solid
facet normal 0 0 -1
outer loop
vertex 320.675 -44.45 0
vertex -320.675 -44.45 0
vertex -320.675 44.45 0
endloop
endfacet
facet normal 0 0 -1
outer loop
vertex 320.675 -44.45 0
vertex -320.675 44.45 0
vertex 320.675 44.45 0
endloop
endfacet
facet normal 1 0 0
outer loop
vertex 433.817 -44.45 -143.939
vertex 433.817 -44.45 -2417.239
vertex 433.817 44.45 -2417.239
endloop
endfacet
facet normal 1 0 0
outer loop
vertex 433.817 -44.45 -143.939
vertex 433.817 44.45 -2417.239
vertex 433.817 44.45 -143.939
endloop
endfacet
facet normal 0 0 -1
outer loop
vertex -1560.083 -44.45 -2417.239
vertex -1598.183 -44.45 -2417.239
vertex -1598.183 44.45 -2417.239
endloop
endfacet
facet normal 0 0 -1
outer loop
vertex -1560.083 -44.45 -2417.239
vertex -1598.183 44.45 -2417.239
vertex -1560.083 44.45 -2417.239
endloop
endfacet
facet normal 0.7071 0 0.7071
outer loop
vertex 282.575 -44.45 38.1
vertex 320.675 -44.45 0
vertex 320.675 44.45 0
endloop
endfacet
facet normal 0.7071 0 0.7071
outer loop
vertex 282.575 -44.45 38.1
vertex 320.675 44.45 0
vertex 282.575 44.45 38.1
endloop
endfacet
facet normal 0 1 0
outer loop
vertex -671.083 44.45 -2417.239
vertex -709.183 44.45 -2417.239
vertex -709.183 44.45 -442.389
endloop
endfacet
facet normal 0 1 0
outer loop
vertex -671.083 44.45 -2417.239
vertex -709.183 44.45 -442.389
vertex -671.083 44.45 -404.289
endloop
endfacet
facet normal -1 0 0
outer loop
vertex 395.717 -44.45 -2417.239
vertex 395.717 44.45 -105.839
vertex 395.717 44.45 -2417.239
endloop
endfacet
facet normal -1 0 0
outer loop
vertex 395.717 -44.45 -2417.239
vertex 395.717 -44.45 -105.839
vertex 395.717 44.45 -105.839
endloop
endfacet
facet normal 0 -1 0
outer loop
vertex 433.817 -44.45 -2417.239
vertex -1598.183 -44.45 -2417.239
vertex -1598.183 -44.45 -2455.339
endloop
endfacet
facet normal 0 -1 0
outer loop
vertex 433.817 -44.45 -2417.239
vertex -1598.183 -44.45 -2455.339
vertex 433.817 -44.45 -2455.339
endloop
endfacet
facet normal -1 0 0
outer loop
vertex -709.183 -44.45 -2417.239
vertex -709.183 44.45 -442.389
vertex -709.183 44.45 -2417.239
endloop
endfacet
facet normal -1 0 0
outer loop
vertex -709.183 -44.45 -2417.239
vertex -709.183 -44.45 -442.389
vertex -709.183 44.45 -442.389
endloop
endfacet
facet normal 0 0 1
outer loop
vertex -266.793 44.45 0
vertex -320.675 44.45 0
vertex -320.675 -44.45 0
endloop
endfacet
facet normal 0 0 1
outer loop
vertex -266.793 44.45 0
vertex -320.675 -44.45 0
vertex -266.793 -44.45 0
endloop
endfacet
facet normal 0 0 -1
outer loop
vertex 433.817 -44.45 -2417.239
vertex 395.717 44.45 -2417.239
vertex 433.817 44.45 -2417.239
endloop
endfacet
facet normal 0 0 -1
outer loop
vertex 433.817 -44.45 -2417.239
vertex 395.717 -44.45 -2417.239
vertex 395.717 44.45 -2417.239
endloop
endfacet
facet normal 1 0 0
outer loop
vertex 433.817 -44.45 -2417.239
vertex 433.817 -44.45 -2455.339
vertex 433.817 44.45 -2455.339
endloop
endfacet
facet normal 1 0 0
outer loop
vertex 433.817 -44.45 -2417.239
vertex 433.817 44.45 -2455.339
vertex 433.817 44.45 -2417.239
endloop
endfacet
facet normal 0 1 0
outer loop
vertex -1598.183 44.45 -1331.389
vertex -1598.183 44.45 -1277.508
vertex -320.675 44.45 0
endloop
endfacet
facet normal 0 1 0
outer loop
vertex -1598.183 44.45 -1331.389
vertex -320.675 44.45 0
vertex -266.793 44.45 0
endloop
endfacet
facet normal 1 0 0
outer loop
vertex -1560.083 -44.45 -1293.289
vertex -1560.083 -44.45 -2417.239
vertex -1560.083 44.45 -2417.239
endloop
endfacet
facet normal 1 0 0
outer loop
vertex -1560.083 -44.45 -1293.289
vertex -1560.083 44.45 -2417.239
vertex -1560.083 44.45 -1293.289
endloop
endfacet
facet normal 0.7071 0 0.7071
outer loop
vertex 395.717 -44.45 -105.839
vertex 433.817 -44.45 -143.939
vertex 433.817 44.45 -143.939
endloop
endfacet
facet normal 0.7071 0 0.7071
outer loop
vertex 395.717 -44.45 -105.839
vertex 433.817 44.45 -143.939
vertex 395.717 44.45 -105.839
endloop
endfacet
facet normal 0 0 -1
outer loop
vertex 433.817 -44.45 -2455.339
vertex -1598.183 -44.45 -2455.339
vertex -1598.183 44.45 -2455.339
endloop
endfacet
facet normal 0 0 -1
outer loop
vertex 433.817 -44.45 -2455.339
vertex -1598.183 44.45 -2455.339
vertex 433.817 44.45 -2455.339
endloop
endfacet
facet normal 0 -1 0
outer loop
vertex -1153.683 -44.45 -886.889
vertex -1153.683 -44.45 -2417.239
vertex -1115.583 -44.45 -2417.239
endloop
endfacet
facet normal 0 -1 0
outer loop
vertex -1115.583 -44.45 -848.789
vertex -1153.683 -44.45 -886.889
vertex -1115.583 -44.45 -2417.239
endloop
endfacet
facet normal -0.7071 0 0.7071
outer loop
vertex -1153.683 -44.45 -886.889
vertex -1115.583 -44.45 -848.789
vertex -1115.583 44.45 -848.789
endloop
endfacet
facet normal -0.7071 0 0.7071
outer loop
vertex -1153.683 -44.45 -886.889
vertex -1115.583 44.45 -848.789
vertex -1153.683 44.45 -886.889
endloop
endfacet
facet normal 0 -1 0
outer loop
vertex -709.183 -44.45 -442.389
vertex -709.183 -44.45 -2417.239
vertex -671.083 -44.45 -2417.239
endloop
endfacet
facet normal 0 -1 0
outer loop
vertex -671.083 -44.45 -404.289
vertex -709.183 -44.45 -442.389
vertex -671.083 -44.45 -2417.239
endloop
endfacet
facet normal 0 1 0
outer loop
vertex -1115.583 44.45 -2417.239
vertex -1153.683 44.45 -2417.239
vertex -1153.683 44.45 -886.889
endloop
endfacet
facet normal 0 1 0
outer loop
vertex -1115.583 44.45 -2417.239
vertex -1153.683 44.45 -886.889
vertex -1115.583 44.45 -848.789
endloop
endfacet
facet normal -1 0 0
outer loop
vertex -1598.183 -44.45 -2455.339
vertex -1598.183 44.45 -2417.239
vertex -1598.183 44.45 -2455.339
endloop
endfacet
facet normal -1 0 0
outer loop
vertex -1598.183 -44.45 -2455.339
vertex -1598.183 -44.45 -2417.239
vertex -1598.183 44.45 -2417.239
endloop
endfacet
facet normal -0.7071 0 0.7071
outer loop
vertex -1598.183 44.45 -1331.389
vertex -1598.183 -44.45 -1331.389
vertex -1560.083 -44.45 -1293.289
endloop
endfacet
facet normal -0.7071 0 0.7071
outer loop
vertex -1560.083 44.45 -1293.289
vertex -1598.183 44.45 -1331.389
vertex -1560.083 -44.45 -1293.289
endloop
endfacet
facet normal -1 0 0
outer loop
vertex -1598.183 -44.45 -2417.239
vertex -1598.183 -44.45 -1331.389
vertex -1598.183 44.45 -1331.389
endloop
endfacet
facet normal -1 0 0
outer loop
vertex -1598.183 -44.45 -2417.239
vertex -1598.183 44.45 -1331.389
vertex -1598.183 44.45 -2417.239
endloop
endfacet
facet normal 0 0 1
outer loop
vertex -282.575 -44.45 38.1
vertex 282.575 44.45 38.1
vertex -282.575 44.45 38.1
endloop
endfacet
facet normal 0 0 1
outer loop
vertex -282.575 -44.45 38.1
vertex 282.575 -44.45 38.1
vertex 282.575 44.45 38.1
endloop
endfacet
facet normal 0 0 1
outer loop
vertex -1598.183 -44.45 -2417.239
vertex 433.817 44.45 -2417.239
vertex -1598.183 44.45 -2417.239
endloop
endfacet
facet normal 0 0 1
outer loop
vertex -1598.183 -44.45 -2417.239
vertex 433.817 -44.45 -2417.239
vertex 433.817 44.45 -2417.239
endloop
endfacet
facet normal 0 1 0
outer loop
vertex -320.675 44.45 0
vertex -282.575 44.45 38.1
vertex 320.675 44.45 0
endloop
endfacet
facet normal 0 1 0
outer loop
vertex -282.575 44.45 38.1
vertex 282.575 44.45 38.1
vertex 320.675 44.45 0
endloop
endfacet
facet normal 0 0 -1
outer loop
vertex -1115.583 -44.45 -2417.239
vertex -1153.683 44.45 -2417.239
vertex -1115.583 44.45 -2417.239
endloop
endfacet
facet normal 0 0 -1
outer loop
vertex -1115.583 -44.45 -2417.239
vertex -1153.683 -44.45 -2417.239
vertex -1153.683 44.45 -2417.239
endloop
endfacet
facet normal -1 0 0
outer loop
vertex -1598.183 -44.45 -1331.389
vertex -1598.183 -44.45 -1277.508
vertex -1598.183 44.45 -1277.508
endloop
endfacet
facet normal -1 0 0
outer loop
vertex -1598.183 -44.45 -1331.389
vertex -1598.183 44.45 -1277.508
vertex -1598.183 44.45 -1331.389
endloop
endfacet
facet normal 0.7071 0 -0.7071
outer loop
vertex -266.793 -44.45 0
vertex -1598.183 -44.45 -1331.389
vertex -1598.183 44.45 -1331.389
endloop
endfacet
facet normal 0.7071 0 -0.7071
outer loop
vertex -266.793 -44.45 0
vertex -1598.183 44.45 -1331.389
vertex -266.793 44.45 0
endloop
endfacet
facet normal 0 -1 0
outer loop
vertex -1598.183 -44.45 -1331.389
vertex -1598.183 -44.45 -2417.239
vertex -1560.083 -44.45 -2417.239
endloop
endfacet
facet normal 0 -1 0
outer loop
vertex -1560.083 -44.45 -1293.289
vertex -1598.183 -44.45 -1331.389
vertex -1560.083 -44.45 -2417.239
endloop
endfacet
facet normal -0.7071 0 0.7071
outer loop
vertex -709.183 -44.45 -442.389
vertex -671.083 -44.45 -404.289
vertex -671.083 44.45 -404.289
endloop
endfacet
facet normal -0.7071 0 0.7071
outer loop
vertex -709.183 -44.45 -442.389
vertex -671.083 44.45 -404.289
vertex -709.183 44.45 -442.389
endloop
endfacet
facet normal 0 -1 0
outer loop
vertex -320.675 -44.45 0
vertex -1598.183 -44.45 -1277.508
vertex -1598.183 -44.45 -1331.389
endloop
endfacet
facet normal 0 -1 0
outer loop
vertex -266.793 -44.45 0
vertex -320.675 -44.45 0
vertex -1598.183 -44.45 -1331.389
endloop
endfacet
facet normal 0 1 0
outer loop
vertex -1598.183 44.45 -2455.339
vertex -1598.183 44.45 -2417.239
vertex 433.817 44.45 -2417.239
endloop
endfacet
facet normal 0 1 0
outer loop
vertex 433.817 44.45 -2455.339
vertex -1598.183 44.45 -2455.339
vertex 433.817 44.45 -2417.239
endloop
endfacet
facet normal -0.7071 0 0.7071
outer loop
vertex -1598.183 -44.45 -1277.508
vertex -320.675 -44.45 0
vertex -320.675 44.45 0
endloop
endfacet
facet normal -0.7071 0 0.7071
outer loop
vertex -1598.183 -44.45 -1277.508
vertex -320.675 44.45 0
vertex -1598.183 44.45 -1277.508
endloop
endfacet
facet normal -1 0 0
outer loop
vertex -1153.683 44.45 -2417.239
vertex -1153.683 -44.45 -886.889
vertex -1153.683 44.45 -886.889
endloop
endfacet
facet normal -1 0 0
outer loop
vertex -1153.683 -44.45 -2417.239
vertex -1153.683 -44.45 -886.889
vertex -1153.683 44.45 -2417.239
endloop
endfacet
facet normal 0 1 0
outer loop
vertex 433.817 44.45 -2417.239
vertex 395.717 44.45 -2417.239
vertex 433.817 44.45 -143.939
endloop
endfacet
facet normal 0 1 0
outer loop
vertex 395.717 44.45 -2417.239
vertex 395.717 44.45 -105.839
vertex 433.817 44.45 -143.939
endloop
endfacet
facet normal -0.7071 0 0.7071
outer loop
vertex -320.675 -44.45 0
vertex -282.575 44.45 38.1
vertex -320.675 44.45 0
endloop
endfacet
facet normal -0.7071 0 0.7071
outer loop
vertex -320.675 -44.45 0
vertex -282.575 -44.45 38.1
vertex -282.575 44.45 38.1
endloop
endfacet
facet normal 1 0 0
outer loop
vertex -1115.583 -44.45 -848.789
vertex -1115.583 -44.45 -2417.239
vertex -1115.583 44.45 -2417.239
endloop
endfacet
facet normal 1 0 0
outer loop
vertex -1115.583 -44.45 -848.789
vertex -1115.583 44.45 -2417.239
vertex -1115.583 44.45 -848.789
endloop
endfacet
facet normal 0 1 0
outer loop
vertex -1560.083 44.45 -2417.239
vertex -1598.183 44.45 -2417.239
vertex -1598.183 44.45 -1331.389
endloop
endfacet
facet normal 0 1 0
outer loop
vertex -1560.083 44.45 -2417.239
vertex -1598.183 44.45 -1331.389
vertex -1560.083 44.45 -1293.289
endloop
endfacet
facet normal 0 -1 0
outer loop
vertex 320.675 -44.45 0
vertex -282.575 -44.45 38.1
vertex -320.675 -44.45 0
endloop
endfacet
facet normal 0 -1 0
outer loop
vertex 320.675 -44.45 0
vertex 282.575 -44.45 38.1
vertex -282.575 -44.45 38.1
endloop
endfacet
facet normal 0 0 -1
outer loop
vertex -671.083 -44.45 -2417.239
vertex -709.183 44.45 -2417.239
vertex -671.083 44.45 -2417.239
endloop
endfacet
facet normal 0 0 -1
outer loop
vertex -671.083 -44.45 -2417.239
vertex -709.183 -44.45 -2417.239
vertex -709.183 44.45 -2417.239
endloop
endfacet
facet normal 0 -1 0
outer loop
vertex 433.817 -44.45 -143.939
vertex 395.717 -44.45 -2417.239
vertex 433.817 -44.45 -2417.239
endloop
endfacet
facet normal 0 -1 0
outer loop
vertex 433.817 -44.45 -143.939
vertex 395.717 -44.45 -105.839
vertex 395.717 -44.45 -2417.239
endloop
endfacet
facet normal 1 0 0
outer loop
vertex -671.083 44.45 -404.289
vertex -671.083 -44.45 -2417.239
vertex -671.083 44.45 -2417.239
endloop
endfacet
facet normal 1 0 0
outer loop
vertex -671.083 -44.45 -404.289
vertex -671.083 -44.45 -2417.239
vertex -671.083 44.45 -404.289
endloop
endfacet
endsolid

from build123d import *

# Parameters (mm, degrees)
F1_DEPTH  = 44.45
F3_DEPTH  = 44.45
F5_DEPTH  = 44.45
F7_DEPTH  = 44.45
F10_W     = 38.1
F10_H     = 2273.3
F11_DEPTH = 44.45
F13_DEPTH = 44.45
F15_DEPTH = 44.45


with BuildPart() as f1:
    # F0 (on Front) → F1 (new body, symmetric)
    with BuildSketch(Plane.XZ):
        Polygon((-282.575, 38.1), (-320.675, 0), (320.675, 0), (282.575, 38.1), align=None)
    extrude(amount=F1_DEPTH, both=True)


with BuildPart() as f3:
    # F2 (on Front) → F3 (new body, symmetric)
    with BuildSketch(Plane.XZ):
        Polygon((-282.575, 38.1), (-320.675, 0), (-266.7934632736, 0), (-228.6934632736, 38.1), align=None)
        Polygon((-266.7934632736, 0), (-320.675, 0), (-1598.1825217366, -1277.5075217366), (-1598.1825217366, -1331.389058463), align=None)
    extrude(amount=F3_DEPTH, both=True)

    # F8: cut F1
    add(f1.part, mode=Mode.SUBTRACT)


with BuildPart() as f5:
    # F4 (on Front) → F5 (new body, symmetric)
    with BuildSketch(Plane.XZ):
        Polygon((-1560.0825217366, -1239.4075217366), (-1598.1825217366, -1277.5075217366), (-1598.1825217366, -1331.389058463), (-1560.0825217366, -1293.289058463), align=None)
        Polygon((-1560.0825217366, -1293.289058463), (-1598.1825217366, -1331.389058463), (-1598.1825217366, -2417.239058463), (-1560.0825217366, -2417.239058463), align=None)
    extrude(amount=F5_DEPTH, both=True)

    # F9: cut F3
    add(f3.part, mode=Mode.SUBTRACT)


with BuildPart() as f7:
    # F6 (on Front) → F7 (new body, symmetric)
    with BuildSketch(Plane.XZ):
        Polygon((-1560.0825217366, -2417.239058463), (-1598.1825217366, -2417.239058463), (-1598.1825217366, -2455.339058463), (433.8174782634, -2455.339058463), (433.8174782634, -2417.239058463), align=None)
    extrude(amount=F7_DEPTH, both=True)


with BuildPart() as f11:
    # F10 (on Front) → F11 (new body, symmetric)
    with BuildSketch(Plane.XZ):
        with Locations((414.7674782634, -1280.589058463)):
            Rectangle(F10_W, F10_H)
        Polygon((395.7174782634, -143.939058463), (433.8174782634, -143.939058463), (395.7174782634, -105.839058463), align=None)
    extrude(amount=F11_DEPTH, both=True)


with BuildPart() as f13:
    # F12 (on Front) → F13 (new body, symmetric)
    with BuildSketch(Plane.XZ):
        Polygon((-1153.6825217366, -2417.239058463), (-1115.5825217366, -2417.239058463), (-1115.5825217366, -848.789058463), (-1153.6825217366, -886.889058463), align=None)
    extrude(amount=F13_DEPTH, both=True)


with BuildPart() as f15:
    # F14 (on Front) → F15 (new body, symmetric)
    with BuildSketch(Plane.XZ):
        Polygon((-709.1825217366, -2417.239058463), (-671.0825217366, -2417.239058463), (-671.0825217366, -404.289058463), (-709.1825217366, -442.389058463), align=None)
    extrude(amount=F15_DEPTH, both=True)


solid = Compound([f1.part, f3.part, f5.part, f7.part, f11.part, f13.part, f15.part])
